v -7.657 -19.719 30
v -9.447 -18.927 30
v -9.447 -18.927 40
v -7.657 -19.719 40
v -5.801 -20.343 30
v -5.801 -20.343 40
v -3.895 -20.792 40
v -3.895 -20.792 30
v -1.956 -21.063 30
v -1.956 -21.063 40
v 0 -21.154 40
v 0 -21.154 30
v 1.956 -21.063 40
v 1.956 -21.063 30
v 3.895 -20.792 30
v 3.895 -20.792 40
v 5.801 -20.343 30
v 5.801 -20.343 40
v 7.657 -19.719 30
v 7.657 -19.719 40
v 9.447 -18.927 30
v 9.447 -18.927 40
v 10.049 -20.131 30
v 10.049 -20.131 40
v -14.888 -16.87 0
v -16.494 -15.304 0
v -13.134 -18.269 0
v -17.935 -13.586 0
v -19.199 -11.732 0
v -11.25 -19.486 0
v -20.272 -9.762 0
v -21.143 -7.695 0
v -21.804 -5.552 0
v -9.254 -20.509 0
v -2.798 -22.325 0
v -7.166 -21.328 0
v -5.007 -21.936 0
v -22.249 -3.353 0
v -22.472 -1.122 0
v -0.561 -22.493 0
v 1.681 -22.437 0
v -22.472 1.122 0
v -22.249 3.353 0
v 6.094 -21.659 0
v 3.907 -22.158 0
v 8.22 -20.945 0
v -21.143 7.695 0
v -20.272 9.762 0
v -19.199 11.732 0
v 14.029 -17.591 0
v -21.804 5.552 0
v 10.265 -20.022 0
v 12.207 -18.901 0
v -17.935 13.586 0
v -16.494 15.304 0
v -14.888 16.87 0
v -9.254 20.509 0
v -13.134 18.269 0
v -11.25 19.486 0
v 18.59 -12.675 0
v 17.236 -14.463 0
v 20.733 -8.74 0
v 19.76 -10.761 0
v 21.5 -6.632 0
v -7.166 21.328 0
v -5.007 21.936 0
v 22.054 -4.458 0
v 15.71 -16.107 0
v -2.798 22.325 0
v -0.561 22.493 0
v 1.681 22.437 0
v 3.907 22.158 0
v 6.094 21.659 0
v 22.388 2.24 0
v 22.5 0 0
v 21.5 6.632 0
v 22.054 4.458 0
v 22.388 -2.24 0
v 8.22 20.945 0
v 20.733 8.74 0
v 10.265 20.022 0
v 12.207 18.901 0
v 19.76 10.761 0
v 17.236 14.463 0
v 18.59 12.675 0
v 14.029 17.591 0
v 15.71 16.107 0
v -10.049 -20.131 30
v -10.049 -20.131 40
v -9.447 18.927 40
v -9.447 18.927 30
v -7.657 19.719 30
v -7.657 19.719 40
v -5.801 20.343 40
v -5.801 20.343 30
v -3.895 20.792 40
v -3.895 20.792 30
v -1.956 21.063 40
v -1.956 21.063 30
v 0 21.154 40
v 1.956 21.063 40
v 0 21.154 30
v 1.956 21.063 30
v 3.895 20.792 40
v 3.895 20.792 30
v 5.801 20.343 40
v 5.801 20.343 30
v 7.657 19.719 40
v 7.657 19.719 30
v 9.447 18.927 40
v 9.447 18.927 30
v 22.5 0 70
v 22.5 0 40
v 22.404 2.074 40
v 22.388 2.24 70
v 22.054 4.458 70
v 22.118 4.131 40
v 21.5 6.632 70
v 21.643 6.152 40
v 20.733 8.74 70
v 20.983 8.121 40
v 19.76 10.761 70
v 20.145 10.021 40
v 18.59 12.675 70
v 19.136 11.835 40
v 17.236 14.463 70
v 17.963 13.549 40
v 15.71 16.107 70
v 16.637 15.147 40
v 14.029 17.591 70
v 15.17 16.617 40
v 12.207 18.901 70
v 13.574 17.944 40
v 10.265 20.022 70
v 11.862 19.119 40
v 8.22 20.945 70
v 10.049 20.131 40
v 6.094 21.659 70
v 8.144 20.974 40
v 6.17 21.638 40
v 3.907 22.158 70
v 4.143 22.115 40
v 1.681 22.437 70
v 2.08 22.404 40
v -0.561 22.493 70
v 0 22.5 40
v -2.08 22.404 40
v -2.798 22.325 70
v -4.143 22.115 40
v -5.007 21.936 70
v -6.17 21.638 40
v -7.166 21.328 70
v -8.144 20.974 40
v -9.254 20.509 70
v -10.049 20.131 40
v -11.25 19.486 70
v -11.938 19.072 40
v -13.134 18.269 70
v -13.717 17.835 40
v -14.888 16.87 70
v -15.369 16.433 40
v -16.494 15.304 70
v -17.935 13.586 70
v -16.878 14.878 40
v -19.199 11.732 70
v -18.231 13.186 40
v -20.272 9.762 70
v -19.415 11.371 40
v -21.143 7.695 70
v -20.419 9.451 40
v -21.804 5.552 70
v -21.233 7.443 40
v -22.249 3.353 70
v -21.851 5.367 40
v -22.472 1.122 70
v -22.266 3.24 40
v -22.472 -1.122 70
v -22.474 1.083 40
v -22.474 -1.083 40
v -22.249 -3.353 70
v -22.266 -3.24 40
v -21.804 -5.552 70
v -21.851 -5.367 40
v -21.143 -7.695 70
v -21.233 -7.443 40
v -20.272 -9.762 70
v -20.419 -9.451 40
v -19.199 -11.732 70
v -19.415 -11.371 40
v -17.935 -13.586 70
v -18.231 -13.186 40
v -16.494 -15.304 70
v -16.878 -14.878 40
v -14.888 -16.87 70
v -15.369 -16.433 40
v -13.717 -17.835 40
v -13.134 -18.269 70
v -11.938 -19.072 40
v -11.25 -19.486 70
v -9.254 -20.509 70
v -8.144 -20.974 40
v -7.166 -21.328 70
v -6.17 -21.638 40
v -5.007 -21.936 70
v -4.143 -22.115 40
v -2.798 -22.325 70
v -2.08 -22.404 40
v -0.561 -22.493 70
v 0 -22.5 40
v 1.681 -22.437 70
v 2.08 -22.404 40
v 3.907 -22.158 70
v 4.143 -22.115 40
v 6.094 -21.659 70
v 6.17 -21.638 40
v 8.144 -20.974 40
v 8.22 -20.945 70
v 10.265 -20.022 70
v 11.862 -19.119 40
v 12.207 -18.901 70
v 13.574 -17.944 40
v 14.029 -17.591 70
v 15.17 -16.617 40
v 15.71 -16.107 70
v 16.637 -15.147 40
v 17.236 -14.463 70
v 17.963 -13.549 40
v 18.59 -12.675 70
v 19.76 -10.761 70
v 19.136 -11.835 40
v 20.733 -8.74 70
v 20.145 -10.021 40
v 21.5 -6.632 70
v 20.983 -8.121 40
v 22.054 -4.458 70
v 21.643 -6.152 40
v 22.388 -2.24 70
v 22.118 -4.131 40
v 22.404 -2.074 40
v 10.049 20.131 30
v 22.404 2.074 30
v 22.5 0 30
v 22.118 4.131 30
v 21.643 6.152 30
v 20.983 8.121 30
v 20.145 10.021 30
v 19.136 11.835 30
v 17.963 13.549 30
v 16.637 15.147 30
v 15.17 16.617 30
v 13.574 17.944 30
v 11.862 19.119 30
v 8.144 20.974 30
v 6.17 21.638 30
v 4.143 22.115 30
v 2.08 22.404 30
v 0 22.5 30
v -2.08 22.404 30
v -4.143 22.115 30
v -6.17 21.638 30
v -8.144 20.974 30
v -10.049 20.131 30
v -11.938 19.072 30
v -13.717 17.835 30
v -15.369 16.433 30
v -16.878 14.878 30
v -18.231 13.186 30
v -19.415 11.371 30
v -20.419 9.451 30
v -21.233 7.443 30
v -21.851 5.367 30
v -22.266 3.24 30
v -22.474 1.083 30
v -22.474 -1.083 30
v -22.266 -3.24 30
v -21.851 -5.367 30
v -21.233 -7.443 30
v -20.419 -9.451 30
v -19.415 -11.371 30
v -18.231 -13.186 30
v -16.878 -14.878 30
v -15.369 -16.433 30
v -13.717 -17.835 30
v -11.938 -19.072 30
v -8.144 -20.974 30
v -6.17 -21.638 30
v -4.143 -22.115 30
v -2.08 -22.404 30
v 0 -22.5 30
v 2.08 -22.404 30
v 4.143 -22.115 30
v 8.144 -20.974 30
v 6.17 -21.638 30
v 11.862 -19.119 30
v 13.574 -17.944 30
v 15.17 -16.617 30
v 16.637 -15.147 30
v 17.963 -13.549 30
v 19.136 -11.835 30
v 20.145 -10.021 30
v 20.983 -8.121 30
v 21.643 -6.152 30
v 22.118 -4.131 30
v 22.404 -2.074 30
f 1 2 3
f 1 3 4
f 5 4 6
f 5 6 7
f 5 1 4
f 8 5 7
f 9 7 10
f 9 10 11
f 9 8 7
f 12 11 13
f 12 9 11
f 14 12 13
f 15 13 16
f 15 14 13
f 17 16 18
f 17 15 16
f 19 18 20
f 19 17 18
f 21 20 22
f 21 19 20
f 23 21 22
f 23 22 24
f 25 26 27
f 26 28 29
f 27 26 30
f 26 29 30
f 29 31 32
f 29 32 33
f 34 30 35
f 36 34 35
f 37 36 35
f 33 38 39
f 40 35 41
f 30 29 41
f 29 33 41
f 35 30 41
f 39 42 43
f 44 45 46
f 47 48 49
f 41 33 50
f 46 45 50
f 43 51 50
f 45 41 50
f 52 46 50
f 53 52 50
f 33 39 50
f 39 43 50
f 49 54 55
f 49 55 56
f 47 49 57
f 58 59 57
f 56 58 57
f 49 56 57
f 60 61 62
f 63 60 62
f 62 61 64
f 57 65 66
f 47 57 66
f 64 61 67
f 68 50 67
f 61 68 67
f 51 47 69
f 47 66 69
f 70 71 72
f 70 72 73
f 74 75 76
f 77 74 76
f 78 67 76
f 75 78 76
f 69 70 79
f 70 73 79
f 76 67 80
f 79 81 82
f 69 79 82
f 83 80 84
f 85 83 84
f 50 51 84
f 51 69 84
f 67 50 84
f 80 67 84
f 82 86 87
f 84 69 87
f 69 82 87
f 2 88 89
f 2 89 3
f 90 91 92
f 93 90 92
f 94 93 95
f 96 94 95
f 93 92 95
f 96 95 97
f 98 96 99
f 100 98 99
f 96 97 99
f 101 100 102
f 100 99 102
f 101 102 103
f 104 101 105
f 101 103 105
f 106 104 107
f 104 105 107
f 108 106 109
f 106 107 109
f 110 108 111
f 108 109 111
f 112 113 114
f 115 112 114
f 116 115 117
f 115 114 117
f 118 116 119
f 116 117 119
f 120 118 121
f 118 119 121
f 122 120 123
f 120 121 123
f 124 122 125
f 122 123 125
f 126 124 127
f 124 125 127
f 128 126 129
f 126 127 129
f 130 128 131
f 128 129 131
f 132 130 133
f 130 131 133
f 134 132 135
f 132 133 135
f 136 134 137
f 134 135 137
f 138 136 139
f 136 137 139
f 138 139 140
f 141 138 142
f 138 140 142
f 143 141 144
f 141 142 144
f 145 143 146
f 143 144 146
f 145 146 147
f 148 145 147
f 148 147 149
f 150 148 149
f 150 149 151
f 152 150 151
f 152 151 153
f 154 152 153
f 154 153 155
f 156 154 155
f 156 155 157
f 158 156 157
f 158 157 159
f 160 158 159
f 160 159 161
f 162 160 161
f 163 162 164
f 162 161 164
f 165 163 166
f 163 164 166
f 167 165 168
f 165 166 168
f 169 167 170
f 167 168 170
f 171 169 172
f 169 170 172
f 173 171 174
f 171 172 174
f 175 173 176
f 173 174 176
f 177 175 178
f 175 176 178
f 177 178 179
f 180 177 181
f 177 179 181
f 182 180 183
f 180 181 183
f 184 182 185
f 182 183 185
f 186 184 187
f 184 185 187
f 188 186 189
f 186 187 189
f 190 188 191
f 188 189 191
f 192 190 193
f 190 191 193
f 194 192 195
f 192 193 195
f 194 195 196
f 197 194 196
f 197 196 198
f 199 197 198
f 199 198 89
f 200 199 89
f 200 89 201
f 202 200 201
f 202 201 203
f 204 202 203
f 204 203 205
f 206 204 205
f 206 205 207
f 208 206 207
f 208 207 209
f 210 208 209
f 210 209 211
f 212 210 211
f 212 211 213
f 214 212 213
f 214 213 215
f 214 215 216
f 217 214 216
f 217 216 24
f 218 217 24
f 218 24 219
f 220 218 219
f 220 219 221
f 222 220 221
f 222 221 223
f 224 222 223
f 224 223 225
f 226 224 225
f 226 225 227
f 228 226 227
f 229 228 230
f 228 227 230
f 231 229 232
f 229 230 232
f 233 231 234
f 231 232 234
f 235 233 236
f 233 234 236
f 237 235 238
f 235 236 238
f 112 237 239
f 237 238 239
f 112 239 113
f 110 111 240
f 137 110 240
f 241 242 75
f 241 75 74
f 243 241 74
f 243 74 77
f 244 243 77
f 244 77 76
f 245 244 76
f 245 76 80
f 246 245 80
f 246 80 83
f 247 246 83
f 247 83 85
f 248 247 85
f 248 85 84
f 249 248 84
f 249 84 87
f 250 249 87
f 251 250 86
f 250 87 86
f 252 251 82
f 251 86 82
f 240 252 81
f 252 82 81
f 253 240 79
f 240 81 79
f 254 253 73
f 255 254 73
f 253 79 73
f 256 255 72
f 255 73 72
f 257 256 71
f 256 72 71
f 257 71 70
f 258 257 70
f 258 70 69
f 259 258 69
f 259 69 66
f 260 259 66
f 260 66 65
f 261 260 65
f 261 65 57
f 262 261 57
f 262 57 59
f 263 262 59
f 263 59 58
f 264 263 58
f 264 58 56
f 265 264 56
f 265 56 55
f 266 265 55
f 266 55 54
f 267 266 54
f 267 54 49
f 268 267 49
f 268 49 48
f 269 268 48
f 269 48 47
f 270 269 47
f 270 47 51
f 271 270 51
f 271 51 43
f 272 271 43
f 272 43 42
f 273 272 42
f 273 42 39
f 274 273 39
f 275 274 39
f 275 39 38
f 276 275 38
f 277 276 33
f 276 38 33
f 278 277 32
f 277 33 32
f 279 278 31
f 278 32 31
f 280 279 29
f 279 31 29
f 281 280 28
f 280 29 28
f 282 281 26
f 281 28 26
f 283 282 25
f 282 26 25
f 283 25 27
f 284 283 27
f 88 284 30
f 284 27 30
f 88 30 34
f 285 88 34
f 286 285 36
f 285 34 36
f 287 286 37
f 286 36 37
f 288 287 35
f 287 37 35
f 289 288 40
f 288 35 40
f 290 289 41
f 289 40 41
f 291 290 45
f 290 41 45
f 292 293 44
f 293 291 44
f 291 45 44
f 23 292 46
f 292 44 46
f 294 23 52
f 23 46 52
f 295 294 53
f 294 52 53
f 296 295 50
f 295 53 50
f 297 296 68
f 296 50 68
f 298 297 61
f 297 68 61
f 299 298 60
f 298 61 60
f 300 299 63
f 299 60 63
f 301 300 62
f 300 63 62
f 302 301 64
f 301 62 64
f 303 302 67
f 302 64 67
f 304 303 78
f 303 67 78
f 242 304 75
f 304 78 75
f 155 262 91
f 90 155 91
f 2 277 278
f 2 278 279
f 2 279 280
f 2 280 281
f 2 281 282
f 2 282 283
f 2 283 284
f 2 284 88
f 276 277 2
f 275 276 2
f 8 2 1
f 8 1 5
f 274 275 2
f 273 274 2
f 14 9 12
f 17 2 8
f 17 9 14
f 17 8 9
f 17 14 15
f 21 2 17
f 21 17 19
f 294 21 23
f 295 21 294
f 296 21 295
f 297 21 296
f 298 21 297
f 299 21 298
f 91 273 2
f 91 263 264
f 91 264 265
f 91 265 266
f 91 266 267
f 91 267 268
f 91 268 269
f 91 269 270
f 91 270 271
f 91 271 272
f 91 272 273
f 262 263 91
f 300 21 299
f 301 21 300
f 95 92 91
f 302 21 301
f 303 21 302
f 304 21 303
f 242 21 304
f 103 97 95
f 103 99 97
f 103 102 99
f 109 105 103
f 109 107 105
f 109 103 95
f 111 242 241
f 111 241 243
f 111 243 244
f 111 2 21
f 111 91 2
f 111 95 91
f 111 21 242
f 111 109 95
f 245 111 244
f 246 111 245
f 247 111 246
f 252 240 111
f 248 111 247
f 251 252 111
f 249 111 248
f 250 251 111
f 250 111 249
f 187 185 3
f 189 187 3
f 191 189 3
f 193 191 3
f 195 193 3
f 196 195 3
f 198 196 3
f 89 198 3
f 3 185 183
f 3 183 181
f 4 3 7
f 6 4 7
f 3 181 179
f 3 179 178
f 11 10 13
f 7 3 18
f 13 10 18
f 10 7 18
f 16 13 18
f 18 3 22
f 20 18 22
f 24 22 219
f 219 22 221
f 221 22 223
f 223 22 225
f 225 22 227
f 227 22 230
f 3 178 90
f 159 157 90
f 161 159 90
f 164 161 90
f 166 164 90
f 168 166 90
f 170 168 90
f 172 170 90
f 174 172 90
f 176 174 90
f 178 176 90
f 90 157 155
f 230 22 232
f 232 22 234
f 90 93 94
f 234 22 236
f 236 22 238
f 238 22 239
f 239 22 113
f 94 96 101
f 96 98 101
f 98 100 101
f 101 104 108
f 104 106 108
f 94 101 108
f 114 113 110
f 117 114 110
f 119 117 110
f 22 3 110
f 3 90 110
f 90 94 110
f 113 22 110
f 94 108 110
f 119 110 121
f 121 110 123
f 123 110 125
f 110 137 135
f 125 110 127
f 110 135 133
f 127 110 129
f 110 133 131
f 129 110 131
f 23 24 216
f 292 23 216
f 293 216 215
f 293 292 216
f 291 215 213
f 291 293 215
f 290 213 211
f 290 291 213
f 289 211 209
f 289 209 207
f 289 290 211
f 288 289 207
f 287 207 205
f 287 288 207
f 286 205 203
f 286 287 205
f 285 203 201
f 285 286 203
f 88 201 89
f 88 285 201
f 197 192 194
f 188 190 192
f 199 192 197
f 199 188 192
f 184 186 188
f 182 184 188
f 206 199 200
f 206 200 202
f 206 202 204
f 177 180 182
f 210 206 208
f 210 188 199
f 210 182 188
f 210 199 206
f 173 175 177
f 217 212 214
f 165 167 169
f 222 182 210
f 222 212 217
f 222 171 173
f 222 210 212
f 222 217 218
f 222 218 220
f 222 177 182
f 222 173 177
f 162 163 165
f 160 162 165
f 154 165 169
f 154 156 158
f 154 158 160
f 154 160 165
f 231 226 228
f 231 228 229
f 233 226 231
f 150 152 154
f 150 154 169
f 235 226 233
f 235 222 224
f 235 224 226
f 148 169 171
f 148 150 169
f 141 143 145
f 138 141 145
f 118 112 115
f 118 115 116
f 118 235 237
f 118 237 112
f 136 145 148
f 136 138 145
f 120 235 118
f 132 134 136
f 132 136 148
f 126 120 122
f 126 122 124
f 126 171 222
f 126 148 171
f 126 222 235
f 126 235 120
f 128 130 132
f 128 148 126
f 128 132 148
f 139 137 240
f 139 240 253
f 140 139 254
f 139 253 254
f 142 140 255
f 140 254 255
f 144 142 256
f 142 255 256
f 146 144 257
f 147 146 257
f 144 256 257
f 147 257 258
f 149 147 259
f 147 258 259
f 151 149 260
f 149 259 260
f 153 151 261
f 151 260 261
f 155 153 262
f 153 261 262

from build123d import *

# Parameters (mm, degrees)
SKETCH_1_R      = 22.5
EXTRUDE_1_DEPTH = 30
EXTRUDE_2_DEPTH = 10
SKETCH_4_R      = 22.5
EXTRUDE_3_DEPTH = 30


with BuildPart() as part:
    # 草图1 → 凸台-拉伸1 (new body)
    with BuildSketch(Plane.XY):
        Circle(SKETCH_1_R)
    extrude(amount=EXTRUDE_1_DEPTH)

    # 草图3 → 凸台-拉伸2 (add)
    with BuildSketch(Plane.XY.offset(30)):
        with BuildLine():
            Line((-10.048538424, 20.13148965), (-9.44725249, 18.926858585))
            ThreePointArc((-9.44725249, 18.926858585), (0, 21.153641661), (9.44725249, 18.926858585))
            Line((9.44725249, 18.926858585), (10.048538424, 20.13148965))
            ThreePointArc((10.048538424, 20.13148965), (0, 22.5), (-10.048538424, 20.13148965))
        make_face()
        with BuildLine():
            Line((-10.048538424, -20.13148965), (-9.44725249, -18.926858585))
            ThreePointArc((-9.44725249, -18.926858585), (0, -21.153641661), (9.44725249, -18.926858585))
            Line((9.44725249, -18.926858585), (10.048538424, -20.13148965))
            ThreePointArc((10.048538424, -20.13148965), (0, -22.5), (-10.048538424, -20.13148965))
        make_face()
    extrude(amount=EXTRUDE_2_DEPTH)

    # 草图4 → 凸台-拉伸3 (add)
    with BuildSketch(Plane.XY.offset(40)):
        Circle(SKETCH_4_R)
    extrude(amount=EXTRUDE_3_DEPTH)


solid = part.part
